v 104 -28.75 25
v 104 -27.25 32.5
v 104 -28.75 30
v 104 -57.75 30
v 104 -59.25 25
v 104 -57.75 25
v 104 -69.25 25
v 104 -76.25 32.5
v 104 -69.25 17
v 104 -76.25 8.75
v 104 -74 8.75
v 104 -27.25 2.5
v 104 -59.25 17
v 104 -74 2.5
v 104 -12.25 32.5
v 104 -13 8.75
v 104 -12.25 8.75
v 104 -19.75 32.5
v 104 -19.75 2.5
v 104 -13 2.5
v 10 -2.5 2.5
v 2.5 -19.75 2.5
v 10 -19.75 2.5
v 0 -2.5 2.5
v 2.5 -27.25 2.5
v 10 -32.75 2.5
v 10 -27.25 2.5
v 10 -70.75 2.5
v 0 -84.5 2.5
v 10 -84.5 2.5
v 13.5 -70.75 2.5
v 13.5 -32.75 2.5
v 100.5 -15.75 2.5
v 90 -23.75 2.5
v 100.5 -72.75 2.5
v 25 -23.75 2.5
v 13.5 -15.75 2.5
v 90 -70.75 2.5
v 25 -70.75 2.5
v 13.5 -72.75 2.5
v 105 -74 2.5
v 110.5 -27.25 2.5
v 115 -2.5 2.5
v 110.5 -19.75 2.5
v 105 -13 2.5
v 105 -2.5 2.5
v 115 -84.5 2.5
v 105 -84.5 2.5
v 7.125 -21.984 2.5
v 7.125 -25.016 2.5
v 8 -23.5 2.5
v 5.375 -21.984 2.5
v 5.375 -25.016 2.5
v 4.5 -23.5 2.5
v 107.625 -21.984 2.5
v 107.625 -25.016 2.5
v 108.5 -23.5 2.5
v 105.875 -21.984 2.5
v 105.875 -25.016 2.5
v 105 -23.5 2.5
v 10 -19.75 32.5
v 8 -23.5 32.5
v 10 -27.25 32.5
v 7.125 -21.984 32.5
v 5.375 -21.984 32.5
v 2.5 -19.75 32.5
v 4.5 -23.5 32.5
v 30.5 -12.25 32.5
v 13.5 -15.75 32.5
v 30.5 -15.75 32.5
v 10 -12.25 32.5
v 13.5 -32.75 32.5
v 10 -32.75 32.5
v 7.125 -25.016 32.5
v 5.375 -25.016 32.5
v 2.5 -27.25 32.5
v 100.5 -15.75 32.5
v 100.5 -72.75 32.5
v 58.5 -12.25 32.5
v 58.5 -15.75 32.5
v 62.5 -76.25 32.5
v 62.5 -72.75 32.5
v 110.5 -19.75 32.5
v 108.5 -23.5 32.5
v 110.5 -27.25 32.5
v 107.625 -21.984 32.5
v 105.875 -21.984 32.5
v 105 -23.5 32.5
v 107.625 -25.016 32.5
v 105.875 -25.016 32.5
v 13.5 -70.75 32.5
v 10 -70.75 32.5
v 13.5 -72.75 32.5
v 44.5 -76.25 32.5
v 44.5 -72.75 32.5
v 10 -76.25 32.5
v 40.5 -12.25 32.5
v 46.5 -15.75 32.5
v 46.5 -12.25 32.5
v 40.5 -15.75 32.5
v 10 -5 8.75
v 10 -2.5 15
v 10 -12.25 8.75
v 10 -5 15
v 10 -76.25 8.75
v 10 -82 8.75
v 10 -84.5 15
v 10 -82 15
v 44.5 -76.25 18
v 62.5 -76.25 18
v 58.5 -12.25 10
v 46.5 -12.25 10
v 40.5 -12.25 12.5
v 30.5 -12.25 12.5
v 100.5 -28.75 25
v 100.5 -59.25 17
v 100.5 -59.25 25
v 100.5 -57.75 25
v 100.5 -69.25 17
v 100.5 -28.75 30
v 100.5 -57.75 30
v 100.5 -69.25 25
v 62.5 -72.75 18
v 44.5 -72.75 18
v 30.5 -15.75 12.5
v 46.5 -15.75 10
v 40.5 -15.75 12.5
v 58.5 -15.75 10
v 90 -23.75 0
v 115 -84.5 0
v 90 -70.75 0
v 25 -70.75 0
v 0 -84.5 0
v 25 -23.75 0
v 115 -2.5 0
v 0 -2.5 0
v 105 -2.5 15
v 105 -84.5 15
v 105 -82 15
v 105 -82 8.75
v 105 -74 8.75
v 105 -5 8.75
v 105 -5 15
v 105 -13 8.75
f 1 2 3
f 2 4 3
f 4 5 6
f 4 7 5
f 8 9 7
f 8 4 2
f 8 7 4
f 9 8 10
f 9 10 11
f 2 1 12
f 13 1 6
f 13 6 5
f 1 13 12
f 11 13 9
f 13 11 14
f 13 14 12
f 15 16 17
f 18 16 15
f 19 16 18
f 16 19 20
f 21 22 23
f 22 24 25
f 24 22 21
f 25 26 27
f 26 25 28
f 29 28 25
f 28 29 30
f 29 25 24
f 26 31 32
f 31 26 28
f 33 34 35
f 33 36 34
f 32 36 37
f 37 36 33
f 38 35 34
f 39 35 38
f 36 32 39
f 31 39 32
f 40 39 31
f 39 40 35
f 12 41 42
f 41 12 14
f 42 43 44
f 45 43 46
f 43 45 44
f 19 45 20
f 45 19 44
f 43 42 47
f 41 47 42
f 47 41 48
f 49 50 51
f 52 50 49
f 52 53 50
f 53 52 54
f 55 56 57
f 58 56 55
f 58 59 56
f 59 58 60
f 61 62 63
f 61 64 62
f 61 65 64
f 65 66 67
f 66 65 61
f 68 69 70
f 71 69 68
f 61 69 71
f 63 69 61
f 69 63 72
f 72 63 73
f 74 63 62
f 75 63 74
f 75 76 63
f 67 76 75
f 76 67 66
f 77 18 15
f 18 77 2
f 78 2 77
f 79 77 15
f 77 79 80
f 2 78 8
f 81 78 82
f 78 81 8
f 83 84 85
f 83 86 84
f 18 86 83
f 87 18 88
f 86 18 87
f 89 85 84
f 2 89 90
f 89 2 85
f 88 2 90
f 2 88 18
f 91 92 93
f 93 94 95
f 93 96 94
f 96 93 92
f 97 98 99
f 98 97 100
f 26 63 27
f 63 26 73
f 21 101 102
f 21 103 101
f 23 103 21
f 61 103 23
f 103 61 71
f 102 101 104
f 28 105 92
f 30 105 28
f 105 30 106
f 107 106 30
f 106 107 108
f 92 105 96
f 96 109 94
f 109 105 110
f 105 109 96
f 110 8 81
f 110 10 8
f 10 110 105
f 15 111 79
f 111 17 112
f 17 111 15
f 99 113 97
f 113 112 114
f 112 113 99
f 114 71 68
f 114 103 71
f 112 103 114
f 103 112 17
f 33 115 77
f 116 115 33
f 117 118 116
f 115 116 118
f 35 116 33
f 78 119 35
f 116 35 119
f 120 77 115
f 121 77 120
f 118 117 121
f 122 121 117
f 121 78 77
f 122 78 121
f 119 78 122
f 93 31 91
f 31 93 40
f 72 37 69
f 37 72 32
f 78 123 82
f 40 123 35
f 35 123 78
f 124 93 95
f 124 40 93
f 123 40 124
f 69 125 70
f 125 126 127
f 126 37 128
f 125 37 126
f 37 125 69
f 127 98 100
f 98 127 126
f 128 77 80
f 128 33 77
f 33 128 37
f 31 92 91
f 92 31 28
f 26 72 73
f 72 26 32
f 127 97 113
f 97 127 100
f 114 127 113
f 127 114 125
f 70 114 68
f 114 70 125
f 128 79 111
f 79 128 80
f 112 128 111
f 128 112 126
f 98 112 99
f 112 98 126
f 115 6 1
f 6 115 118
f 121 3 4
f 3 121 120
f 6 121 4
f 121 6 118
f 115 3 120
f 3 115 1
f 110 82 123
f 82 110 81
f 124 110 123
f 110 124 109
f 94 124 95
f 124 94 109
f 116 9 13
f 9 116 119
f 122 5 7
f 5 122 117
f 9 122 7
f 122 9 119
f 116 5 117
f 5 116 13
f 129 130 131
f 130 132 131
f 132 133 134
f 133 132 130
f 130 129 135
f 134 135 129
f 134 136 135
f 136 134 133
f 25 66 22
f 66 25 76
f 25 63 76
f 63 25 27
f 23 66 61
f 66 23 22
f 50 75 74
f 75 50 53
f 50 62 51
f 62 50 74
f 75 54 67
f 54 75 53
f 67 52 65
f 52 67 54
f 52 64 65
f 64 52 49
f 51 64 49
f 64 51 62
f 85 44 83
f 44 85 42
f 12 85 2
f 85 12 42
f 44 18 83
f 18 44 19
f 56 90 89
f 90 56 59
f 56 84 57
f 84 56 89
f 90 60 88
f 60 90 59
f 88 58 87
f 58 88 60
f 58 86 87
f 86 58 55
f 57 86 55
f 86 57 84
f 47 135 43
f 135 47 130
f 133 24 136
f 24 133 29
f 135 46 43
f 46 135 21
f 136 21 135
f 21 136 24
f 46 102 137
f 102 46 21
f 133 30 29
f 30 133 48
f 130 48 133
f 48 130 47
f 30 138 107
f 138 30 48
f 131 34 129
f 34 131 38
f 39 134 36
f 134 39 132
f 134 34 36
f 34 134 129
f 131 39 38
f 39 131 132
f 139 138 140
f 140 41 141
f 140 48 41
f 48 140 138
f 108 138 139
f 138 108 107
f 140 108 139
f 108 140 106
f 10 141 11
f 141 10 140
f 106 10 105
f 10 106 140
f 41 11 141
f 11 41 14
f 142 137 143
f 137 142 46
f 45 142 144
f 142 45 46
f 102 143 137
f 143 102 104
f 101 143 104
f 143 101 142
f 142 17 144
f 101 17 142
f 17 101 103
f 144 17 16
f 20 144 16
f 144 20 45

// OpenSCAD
// basics
pi_w = 85;
pi_h = 55;
margin = 2;
wall = 2.5;
depth = 30;

// USB + ethernet hole
usb_w = 38;
usb_h = depth;
usb_offset = 1;

// Jack hole
jack_w = 10;
jack_h = 15;
jack_offset = 16;

// Video hole
video_w = 12;
video_h = 20;
video_offset = 32;

// SD card hole
sd_h = 5;
sd_w = 29;
sd_offset = 12;


// HDMI hole
hdmi_h = 12;
hdmi_w = 18;
hdmi_offset = 30;

// Power USB hole
power_h = 8;
power_w = 10;
power_offset = 2.5;


// the front face
front_h = 82;
front_border = 25;
front_offset = 10;
front_depth = 15;
front_second = 8;

// display
display_w = 65;
display_h = 47;
display_w_offset = 10;
display_h_offset = 1;

// What to render
translate([+((display_w+2*front_border)-pi_w)/2-wall*2,-(front_h-pi_h-wall)/2,depth+wall])
	rotate([180,0,0])
		box();
translate([0,-front_h-wall,0])
	front();

module box() {
	difference() {
		bottom();
		usb_ethernet();
		jack();
		video();
		sd();
		hdmi();
		power();
	}
	poles();
}

module front() {
	difference() {
		cube([front_border*2+display_w,front_h,wall]);
		translate([front_border,(front_h-display_h)/2-wall*1.5,-wall]) cube([display_w,display_h,wall*3]);
	}
	translate([front_offset,0,0])
		cube([display_w+2*front_border-2*front_offset,wall,front_depth]);
	translate([front_offset,0,0])
		cube([display_w+2*front_border-2*front_offset,front_second+wall,3.5*wall]);
	translate([front_offset,front_h-wall,0])
		cube([display_w+2*front_border-2*front_offset,wall,front_depth]);
	//translate([front_offset,front_second,0])
		//cube([display_w+2*front_border-2*front_offset,wall,front_depth]);
	//translate([front_offset,front_h-wall-front_second,0])
		//cube([display_w+2*front_border-2*front_offset,wall,front_depth]);
	translate([front_offset,front_h-wall-front_second,0])
		cube([display_w+2*front_border-2*front_offset,front_second,3.5*wall]);
}

module bottom() {
	difference() {
		cube([pi_w+2*margin+2*wall,pi_h+2*margin+2*wall,depth]);
		translate([wall+margin/2,wall+margin/2,-wall]) cube([pi_w+margin,pi_h+margin,depth+2*wall]);
	}
}

module usb_ethernet() {
	translate([-wall/2,wall+margin+pi_h-usb_w-usb_offset,0])
		cube([2*wall,usb_w,usb_h]);
}

module poles() {
	translate([-wall*3,wall*3,0]) difference() {
		cube([3*wall,3*wall,depth+wall]);
		translate([wall*1.5,wall*1.5,0]) cylinder(r=wall*0.7,h=depth+3*wall);
	}
	translate([wall*4+pi_w-margin,wall*3,0]) difference() {
		cube([3*wall,3*wall,depth+wall]);
		translate([wall*1.5,wall*1.5,0]) cylinder(r=wall*0.7,h=depth+3*wall);
	}
}

module sd() {
	translate([pi_w+wall*1.5,wall+margin+sd_offset,wall])
		cube([3*wall,sd_w,sd_h]);
}

module jack() {
	translate([wall+margin+jack_offset,-wall/2,0])
		cube([jack_w,2*wall,jack_h+2*wall]);
}

module video() {
	translate([wall+margin+video_offset,-wall/2,0])
		cube([video_w,2*wall,video_h+wall]);
}

module hdmi() {
	translate([wall+margin+hdmi_offset,pi_h+wall*1.5,0])
		cube([hdmi_w,3*wall,hdmi_h+wall]);
}

module power() {
	translate([pi_w+wall*1.5,wall+margin+pi_h-power_w-power_offset,wall*3])
		cube([3*wall,power_w,power_h]);
}
